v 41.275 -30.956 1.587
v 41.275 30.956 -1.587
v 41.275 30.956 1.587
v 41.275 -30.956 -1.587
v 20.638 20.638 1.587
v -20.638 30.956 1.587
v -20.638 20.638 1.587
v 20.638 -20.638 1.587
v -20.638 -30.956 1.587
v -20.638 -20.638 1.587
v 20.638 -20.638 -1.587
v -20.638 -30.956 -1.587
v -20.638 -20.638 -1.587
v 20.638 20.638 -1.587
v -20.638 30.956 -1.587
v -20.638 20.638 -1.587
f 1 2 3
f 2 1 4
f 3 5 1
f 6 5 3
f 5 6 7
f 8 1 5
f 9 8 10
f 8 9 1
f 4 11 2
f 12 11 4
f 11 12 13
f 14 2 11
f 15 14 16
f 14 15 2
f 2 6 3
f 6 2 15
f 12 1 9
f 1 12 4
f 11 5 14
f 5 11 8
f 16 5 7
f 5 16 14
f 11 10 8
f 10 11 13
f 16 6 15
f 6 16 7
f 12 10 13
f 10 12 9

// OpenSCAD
// What size you want to gauge to be for
t_size=1.625;


// Conversion Factor for Inches(25.4) or MM (1)
conversion = 25.4; // [25.4,1]


jaws= t_size * conversion;

height=(.125) * conversion;

top=jaws * .25;
side=jaws * .25; // .40

arm=side;



union() {
// If you want to see the cylinder
//cylinder(h=height,d=jaws,center=true);


// Handle
translate([((jaws/2)+side+top/2),0,0]) cube(size=[top, jaws+arm+side, height], center=true);


// Top bar
translate([(jaws/2)+(side/2),0,0]) cube(size=[side, jaws, height], center=true);

// Side Bar (Right)
translate([side-(arm/2),(((jaws/2))+(side/2))*1,0]) cube(size=[jaws+arm, side, height], center=true);
// Side Bar (Left)
translate([side-(arm/2),(((jaws/2))+(side/2))*-1,0]) cube(size=[jaws+arm, side, height], center=true);


};



